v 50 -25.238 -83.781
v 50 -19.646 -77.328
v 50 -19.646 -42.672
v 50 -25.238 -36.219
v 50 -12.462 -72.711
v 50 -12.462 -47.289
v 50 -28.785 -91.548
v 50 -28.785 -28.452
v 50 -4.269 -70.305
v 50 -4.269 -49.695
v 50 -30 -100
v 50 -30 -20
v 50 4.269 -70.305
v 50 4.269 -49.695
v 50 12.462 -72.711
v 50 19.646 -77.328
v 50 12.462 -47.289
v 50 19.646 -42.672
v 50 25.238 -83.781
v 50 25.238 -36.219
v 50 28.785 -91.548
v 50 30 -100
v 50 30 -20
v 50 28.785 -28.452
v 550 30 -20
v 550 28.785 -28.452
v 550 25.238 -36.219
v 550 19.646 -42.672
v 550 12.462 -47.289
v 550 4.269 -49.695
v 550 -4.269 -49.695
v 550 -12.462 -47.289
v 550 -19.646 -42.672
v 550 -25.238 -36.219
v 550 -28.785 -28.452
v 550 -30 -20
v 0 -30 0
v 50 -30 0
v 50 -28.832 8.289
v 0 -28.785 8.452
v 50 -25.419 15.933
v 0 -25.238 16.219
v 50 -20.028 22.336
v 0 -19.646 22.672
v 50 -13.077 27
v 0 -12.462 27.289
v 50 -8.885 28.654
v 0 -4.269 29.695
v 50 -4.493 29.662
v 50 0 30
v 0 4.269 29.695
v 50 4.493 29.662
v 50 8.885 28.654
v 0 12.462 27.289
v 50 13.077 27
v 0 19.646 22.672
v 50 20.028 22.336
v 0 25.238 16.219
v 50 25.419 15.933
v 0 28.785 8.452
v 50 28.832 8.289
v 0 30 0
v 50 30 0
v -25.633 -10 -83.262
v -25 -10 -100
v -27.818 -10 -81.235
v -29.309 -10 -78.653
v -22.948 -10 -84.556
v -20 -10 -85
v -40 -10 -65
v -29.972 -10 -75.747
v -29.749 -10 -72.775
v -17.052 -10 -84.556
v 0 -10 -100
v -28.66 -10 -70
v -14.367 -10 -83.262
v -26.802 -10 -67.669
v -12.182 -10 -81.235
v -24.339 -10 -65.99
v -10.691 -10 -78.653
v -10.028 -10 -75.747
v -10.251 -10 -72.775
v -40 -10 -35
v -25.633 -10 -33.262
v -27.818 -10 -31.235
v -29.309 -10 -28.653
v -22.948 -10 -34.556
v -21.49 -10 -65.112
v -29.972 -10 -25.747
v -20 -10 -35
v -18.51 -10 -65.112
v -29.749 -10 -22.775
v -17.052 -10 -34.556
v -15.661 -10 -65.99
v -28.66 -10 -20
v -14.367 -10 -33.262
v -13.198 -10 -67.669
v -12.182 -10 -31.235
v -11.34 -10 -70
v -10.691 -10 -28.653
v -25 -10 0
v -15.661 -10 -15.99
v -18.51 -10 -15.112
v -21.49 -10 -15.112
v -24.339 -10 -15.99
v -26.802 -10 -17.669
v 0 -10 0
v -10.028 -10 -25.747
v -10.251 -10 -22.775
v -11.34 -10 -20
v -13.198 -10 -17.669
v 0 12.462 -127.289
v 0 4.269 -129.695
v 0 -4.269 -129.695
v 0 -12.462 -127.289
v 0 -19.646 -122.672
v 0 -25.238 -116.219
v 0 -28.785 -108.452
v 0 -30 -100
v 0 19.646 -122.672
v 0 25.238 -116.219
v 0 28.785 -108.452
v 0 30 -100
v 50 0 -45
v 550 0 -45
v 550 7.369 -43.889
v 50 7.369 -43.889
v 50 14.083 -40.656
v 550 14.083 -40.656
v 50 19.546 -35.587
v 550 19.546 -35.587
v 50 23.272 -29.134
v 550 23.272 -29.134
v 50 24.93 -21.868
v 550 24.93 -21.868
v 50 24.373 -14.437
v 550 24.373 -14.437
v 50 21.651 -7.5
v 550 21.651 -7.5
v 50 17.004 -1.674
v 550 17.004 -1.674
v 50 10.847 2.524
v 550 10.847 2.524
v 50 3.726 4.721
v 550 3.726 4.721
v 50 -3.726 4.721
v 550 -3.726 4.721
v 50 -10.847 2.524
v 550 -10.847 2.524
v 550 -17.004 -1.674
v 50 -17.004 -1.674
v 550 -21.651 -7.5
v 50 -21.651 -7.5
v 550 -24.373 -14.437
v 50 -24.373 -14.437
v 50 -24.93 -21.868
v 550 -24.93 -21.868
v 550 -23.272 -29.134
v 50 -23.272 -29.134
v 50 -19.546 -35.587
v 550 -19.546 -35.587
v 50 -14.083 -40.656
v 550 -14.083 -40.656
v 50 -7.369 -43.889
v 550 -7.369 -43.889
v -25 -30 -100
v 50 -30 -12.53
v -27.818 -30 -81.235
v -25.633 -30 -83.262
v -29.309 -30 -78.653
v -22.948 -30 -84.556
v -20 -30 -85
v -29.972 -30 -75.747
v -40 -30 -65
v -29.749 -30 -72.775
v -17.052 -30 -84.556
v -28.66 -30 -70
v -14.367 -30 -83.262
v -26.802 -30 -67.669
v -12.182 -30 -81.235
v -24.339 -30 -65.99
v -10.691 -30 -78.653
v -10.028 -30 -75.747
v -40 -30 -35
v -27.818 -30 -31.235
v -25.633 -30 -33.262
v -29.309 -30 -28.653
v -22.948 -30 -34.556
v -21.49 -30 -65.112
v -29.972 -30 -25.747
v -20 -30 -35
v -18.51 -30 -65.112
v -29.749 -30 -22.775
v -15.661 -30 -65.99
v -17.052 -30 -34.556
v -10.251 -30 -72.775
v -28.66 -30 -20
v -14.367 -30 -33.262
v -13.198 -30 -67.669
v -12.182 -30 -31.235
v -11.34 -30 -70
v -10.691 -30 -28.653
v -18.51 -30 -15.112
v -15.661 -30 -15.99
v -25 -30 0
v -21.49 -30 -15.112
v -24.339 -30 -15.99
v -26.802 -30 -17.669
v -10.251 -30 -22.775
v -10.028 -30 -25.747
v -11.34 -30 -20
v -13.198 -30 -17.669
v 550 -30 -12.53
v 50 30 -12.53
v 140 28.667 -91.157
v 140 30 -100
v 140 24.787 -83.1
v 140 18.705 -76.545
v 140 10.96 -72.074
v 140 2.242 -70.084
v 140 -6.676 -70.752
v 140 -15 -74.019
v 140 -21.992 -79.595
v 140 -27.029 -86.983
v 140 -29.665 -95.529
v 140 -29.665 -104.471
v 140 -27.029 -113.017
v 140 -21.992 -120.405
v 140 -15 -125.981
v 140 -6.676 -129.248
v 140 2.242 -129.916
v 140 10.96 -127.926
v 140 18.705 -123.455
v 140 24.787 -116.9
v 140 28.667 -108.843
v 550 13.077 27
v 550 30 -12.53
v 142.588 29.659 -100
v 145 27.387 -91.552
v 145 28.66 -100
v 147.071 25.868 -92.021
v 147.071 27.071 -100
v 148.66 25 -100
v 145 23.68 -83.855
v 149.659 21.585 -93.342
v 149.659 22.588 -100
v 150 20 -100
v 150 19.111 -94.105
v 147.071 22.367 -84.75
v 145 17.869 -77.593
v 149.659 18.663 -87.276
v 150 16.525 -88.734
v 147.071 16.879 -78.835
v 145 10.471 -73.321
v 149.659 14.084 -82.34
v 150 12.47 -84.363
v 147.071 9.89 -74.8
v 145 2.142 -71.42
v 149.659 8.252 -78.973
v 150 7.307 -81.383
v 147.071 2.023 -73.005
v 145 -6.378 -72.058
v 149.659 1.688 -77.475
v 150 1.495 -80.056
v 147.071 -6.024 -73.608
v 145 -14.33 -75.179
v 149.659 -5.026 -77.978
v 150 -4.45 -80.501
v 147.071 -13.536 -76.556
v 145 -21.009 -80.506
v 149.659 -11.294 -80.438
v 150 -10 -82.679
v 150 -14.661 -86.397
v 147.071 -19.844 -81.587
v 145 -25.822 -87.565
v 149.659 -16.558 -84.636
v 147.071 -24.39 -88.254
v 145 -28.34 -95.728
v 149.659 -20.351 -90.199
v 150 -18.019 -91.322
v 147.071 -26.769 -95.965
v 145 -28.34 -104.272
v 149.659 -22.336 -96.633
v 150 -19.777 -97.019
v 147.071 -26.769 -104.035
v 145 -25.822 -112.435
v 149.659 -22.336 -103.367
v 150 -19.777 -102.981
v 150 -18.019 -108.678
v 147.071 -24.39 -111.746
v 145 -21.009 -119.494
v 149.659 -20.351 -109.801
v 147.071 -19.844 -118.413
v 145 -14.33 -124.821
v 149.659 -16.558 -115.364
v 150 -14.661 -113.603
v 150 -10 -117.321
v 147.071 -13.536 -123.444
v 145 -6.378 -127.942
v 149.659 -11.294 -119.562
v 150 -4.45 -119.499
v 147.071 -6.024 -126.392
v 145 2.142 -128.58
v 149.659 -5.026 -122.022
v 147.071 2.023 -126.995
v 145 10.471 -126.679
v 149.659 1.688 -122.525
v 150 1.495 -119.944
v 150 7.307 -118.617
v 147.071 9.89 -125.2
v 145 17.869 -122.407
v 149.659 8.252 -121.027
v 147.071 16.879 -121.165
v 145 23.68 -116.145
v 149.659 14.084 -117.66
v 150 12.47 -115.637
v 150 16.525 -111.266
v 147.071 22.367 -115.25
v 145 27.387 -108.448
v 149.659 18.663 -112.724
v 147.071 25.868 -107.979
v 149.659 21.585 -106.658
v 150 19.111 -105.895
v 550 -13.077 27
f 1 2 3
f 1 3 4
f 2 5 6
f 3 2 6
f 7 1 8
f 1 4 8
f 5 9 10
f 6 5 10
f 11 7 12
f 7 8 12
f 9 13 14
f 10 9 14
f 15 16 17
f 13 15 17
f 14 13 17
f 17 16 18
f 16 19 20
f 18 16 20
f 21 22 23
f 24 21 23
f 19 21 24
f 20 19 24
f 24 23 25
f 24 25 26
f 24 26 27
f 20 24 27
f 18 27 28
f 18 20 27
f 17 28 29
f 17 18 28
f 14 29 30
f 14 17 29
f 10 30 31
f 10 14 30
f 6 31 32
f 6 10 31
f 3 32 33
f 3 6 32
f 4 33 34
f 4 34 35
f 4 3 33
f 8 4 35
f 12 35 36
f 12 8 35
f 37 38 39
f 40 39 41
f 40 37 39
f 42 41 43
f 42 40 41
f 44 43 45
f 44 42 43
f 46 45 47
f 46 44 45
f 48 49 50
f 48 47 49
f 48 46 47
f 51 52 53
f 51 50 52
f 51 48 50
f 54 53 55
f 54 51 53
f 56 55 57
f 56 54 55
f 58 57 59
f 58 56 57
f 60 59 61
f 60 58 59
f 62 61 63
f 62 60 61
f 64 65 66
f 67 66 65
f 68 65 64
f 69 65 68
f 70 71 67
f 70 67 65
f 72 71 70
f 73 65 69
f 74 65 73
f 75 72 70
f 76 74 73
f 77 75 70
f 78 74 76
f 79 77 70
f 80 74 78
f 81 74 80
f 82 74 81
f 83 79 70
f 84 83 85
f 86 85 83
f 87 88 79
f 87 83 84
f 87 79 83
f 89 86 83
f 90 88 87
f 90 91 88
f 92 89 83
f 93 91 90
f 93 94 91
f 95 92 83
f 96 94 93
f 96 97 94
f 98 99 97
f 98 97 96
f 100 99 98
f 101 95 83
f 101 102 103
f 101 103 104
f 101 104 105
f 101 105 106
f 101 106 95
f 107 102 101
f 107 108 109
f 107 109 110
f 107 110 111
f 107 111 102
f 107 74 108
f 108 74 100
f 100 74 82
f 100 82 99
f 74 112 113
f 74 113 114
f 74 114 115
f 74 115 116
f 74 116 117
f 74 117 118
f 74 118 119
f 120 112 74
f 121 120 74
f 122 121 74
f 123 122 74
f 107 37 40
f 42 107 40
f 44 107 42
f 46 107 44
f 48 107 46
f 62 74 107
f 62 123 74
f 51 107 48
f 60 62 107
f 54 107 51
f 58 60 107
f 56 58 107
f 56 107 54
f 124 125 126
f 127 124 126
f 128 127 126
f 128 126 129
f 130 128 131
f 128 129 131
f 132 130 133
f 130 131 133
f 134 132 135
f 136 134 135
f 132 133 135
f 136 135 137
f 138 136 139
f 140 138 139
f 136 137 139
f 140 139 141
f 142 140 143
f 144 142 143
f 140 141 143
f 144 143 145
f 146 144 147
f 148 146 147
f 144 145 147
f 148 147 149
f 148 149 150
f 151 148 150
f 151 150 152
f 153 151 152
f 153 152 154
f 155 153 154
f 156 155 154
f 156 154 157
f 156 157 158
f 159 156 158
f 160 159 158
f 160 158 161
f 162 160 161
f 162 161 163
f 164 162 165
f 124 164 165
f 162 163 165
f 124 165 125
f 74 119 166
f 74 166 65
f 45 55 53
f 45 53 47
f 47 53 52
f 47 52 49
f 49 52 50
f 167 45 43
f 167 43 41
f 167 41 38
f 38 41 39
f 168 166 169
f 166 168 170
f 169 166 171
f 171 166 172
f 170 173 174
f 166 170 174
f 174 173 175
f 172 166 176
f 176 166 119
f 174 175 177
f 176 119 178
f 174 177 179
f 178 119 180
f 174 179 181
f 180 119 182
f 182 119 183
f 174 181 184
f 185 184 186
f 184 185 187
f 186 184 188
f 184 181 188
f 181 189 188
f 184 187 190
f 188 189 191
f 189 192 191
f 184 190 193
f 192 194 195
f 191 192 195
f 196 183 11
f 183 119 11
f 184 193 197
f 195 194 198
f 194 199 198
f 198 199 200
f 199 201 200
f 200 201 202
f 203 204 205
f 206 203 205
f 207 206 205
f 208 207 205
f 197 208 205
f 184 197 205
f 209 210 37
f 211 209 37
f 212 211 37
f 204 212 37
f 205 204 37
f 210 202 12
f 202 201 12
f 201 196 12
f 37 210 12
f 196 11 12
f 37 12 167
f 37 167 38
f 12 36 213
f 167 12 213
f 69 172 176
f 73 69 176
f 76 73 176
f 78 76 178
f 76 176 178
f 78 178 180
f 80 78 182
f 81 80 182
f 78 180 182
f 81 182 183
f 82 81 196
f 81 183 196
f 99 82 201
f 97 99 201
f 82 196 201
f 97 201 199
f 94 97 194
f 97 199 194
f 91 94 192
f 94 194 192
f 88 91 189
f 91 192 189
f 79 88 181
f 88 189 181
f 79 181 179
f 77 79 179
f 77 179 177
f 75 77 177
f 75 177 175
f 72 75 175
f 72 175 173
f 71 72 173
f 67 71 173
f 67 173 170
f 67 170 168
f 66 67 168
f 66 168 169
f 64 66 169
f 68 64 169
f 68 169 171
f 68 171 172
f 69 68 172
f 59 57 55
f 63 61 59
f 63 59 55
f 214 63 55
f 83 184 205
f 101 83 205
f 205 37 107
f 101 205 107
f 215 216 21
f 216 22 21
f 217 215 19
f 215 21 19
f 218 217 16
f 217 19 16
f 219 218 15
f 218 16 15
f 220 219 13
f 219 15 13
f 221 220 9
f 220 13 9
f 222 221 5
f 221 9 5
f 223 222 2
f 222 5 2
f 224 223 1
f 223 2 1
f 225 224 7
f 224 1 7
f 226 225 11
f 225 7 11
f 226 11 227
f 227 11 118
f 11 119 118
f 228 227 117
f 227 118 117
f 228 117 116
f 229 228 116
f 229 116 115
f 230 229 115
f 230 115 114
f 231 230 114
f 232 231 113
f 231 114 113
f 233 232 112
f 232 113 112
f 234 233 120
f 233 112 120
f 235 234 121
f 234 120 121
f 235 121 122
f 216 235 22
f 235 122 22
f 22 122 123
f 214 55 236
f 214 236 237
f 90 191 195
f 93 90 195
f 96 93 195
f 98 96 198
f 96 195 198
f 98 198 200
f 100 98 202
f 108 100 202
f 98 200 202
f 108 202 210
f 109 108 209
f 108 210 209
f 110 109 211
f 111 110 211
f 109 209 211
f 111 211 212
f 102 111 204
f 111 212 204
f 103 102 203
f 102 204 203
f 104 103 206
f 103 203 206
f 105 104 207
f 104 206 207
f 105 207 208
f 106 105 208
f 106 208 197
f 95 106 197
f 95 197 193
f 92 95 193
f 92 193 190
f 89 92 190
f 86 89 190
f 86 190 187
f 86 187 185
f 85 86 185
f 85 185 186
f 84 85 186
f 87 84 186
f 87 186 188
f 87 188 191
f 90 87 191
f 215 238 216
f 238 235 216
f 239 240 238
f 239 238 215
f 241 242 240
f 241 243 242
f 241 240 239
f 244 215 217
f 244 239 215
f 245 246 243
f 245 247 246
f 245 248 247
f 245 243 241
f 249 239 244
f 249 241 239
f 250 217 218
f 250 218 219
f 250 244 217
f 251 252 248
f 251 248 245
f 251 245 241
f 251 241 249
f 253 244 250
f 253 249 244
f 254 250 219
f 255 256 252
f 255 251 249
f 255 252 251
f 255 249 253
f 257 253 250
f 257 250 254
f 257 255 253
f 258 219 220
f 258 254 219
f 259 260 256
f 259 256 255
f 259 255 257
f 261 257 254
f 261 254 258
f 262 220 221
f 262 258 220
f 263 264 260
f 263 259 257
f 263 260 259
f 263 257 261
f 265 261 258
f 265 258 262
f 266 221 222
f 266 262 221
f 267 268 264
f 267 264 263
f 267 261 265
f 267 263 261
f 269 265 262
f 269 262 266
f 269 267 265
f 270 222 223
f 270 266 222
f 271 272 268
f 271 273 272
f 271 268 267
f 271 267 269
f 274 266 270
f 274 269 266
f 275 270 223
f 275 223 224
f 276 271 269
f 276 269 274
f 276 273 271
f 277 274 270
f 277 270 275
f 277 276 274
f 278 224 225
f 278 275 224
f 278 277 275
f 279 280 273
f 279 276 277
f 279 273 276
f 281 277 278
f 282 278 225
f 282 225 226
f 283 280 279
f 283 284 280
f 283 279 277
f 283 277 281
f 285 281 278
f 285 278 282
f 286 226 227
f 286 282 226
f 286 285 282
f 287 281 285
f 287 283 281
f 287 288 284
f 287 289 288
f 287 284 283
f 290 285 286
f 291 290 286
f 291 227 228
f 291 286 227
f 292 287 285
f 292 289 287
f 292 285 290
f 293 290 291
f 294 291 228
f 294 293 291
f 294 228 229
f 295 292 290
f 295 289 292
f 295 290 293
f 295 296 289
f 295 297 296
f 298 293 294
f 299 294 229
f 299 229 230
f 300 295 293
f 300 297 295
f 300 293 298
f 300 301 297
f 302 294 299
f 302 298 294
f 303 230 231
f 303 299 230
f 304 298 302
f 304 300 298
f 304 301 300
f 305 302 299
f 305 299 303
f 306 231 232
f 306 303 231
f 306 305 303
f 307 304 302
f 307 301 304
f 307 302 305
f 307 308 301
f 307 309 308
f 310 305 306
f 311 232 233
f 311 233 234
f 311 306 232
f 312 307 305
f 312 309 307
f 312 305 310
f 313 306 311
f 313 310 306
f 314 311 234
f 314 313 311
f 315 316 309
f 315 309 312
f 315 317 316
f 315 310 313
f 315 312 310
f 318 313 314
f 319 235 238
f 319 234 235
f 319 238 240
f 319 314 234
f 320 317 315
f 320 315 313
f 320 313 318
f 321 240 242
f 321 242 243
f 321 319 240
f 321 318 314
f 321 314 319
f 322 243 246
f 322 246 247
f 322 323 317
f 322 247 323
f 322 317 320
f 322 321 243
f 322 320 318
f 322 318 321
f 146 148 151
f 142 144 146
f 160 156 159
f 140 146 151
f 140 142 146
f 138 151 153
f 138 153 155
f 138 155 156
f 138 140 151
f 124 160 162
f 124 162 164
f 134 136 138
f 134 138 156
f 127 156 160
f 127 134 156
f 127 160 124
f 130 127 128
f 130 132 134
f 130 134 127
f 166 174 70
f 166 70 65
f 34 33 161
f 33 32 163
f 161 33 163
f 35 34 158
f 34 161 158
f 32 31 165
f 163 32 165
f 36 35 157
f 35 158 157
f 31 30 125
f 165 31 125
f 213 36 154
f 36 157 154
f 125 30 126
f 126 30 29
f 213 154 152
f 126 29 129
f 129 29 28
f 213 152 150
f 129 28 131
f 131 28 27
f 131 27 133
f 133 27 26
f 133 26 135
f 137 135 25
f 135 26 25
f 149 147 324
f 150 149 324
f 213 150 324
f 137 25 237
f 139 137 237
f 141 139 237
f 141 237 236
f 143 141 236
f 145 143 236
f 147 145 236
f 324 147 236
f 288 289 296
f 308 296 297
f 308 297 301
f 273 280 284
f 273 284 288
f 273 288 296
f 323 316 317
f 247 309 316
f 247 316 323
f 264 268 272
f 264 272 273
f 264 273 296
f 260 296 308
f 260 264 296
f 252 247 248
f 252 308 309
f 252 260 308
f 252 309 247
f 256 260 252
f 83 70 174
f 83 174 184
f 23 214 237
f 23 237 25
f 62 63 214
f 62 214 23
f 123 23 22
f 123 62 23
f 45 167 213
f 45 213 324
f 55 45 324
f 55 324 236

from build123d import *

# Parameters (mm, degrees)
BOSS_EXTRUDE3_DEPTH = 50
SKETCH7_R           = 30
BOSS_EXTRUDE4_DEPTH = 100
BOSS_EXTRUDE7_DEPTH = 500
SKETCH9_R           = 25
CUT_EXTRUDE1_DEPTH  = 500
CUT_EXTRUDE2_START  = -500
CUT_EXTRUDE2_DEPTH  = 500
FILLET1_R           = 10
SKETCH12_W          = 100
SKETCH12_H          = 20
BOSS_EXTRUDE8_DEPTH = 40
CUT_EXTRUDE3_DEPTH  = 40
SKETCH14_R          = 10
CUT_EXTRUDE4_DEPTH  = 40


with BuildPart() as part:
    # Sketch3 → Boss-Extrude3 (new body)
    with BuildSketch(Plane(origin=(0, 0, 0), x_dir=(0, 0, -1), z_dir=(1, 0, 0))):
        with BuildLine():
            Line((0, 30), (100, 30))
            ThreePointArc((100, 30), (130, 0), (100, -30))
            Line((100, -30), (0, -30))
            ThreePointArc((0, -30), (-30, 0), (0, 30))
        make_face()
    extrude(amount=BOSS_EXTRUDE3_DEPTH)

    # Sketch7 → Boss-Extrude4 (add)
    with BuildSketch(Plane(origin=(50, 0, 0), x_dir=(0, 0, -1), z_dir=(1, 0, 0))):
        with Locations(Location((100, 0, 0), (0, 0, 90))):
            Circle(SKETCH7_R)
    extrude(amount=BOSS_EXTRUDE4_DEPTH)

    # Sketch8 → Boss-Extrude7 (add)
    with BuildSketch(Plane(origin=(50, 0, 0), x_dir=(0, 0, -1), z_dir=(1, 0, 0))):
        with BuildLine():
            Line((0, 30), (20, 30))
            ThreePointArc((20, 30), (50, 0), (20, -30))
            Line((20, -30), (0, -30))
            ThreePointArc((0, -30), (-30, 0), (0, 30))
        make_face()
    extrude(amount=BOSS_EXTRUDE7_DEPTH)

    # Sketch9 → Cut-Extrude1 (cut)
    with BuildSketch(Plane(origin=(550, 0, 0), x_dir=(0, 0, -1), z_dir=(1, 0, 0))):
        with Locations((20, 0)):
            Circle(SKETCH9_R)
    extrude(amount=-CUT_EXTRUDE1_DEPTH, mode=Mode.SUBTRACT)

    # Sketch10 → Cut-Extrude2 (cut)
    with BuildSketch(Plane(origin=(550, 0, 0), x_dir=(0, 0, -1), z_dir=(1, 0, 0)).offset(CUT_EXTRUDE2_START)):
        with BuildLine():
            ThreePointArc((0, 30), (-15.932656638, 25.419489618), (-27, 13.076696831))
            Line((-27, 13.076696831), (12.529758535, 30))
            Line((12.529758535, 30), (0, 30))
        make_face()
        with BuildLine():
            Line((12.529758535, -30), (-27, -13.076696831))
            ThreePointArc((-27, -13.076696831), (-15.932656638, -25.419489618), (0, -30))
            Line((0, -30), (12.529758535, -30))
        make_face()
        with BuildLine():
            Line((-27, 0), (-27, 13.076696831))
            ThreePointArc((-27, 13.076696831), (-29.240383034, 6.708203932), (-30, 0))
            Line((-30, 0), (-27, 0))
        make_face()
        with BuildLine():
            Line((-27, -13.076696831), (-27, 0))
            Line((-27, 0), (-30, 0))
            ThreePointArc((-30, 0), (-29.240383034, -6.708203932), (-27, -13.076696831))
        make_face()
        with BuildLine():
            Line((-27, 0), (-27, 13.076696831))
            ThreePointArc((-27, 13.076696831), (-29.240383034, 6.708203932), (-30, 0))
            Line((-30, 0), (-27, 0))
        make_face()
        with BuildLine():
            Line((-27, -13.076696831), (-27, 0))
            Line((-27, 0), (-30, 0))
            ThreePointArc((-30, 0), (-29.240383034, -6.708203932), (-27, -13.076696831))
        make_face()
    extrude(amount=CUT_EXTRUDE2_DEPTH, mode=Mode.SUBTRACT)

    # Fillet1
    fillet1_edges = [part.edges().sort_by_distance(p)[0] for p in [
        (150, -30, -100),
    ]]
    fillet(fillet1_edges, radius=FILLET1_R)

    # Sketch12 → Boss-Extrude8 (add)
    with BuildSketch(Plane.ZY):
        with Locations((-50, -20)):
            Rectangle(SKETCH12_W, SKETCH12_H)
    extrude(amount=BOSS_EXTRUDE8_DEPTH)

    # Sketch13 → Cut-Extrude3 (cut)
    with BuildSketch(Plane.XZ.offset(30)):
        Polygon((-40, -35), (-25, 0), (-40, 0), align=None)
        Polygon((-40, -65), (-25, -100), (-40, -100), align=None)
    extrude(amount=-CUT_EXTRUDE3_DEPTH, mode=Mode.SUBTRACT)

    # Sketch14 → Cut-Extrude4 (cut)
    with BuildSketch(Plane(origin=(0, -30, 0), x_dir=(-1, 0, 0), z_dir=(0, -1, 0))):
        with Locations(Location((20, 25, 0), (0, 0, 90))):
            Circle(SKETCH14_R)
        with Locations(Location((20, 75, 0), (0, 0, 90))):
            Circle(SKETCH14_R)
    extrude(amount=-CUT_EXTRUDE4_DEPTH, mode=Mode.SUBTRACT)


solid = part.part
